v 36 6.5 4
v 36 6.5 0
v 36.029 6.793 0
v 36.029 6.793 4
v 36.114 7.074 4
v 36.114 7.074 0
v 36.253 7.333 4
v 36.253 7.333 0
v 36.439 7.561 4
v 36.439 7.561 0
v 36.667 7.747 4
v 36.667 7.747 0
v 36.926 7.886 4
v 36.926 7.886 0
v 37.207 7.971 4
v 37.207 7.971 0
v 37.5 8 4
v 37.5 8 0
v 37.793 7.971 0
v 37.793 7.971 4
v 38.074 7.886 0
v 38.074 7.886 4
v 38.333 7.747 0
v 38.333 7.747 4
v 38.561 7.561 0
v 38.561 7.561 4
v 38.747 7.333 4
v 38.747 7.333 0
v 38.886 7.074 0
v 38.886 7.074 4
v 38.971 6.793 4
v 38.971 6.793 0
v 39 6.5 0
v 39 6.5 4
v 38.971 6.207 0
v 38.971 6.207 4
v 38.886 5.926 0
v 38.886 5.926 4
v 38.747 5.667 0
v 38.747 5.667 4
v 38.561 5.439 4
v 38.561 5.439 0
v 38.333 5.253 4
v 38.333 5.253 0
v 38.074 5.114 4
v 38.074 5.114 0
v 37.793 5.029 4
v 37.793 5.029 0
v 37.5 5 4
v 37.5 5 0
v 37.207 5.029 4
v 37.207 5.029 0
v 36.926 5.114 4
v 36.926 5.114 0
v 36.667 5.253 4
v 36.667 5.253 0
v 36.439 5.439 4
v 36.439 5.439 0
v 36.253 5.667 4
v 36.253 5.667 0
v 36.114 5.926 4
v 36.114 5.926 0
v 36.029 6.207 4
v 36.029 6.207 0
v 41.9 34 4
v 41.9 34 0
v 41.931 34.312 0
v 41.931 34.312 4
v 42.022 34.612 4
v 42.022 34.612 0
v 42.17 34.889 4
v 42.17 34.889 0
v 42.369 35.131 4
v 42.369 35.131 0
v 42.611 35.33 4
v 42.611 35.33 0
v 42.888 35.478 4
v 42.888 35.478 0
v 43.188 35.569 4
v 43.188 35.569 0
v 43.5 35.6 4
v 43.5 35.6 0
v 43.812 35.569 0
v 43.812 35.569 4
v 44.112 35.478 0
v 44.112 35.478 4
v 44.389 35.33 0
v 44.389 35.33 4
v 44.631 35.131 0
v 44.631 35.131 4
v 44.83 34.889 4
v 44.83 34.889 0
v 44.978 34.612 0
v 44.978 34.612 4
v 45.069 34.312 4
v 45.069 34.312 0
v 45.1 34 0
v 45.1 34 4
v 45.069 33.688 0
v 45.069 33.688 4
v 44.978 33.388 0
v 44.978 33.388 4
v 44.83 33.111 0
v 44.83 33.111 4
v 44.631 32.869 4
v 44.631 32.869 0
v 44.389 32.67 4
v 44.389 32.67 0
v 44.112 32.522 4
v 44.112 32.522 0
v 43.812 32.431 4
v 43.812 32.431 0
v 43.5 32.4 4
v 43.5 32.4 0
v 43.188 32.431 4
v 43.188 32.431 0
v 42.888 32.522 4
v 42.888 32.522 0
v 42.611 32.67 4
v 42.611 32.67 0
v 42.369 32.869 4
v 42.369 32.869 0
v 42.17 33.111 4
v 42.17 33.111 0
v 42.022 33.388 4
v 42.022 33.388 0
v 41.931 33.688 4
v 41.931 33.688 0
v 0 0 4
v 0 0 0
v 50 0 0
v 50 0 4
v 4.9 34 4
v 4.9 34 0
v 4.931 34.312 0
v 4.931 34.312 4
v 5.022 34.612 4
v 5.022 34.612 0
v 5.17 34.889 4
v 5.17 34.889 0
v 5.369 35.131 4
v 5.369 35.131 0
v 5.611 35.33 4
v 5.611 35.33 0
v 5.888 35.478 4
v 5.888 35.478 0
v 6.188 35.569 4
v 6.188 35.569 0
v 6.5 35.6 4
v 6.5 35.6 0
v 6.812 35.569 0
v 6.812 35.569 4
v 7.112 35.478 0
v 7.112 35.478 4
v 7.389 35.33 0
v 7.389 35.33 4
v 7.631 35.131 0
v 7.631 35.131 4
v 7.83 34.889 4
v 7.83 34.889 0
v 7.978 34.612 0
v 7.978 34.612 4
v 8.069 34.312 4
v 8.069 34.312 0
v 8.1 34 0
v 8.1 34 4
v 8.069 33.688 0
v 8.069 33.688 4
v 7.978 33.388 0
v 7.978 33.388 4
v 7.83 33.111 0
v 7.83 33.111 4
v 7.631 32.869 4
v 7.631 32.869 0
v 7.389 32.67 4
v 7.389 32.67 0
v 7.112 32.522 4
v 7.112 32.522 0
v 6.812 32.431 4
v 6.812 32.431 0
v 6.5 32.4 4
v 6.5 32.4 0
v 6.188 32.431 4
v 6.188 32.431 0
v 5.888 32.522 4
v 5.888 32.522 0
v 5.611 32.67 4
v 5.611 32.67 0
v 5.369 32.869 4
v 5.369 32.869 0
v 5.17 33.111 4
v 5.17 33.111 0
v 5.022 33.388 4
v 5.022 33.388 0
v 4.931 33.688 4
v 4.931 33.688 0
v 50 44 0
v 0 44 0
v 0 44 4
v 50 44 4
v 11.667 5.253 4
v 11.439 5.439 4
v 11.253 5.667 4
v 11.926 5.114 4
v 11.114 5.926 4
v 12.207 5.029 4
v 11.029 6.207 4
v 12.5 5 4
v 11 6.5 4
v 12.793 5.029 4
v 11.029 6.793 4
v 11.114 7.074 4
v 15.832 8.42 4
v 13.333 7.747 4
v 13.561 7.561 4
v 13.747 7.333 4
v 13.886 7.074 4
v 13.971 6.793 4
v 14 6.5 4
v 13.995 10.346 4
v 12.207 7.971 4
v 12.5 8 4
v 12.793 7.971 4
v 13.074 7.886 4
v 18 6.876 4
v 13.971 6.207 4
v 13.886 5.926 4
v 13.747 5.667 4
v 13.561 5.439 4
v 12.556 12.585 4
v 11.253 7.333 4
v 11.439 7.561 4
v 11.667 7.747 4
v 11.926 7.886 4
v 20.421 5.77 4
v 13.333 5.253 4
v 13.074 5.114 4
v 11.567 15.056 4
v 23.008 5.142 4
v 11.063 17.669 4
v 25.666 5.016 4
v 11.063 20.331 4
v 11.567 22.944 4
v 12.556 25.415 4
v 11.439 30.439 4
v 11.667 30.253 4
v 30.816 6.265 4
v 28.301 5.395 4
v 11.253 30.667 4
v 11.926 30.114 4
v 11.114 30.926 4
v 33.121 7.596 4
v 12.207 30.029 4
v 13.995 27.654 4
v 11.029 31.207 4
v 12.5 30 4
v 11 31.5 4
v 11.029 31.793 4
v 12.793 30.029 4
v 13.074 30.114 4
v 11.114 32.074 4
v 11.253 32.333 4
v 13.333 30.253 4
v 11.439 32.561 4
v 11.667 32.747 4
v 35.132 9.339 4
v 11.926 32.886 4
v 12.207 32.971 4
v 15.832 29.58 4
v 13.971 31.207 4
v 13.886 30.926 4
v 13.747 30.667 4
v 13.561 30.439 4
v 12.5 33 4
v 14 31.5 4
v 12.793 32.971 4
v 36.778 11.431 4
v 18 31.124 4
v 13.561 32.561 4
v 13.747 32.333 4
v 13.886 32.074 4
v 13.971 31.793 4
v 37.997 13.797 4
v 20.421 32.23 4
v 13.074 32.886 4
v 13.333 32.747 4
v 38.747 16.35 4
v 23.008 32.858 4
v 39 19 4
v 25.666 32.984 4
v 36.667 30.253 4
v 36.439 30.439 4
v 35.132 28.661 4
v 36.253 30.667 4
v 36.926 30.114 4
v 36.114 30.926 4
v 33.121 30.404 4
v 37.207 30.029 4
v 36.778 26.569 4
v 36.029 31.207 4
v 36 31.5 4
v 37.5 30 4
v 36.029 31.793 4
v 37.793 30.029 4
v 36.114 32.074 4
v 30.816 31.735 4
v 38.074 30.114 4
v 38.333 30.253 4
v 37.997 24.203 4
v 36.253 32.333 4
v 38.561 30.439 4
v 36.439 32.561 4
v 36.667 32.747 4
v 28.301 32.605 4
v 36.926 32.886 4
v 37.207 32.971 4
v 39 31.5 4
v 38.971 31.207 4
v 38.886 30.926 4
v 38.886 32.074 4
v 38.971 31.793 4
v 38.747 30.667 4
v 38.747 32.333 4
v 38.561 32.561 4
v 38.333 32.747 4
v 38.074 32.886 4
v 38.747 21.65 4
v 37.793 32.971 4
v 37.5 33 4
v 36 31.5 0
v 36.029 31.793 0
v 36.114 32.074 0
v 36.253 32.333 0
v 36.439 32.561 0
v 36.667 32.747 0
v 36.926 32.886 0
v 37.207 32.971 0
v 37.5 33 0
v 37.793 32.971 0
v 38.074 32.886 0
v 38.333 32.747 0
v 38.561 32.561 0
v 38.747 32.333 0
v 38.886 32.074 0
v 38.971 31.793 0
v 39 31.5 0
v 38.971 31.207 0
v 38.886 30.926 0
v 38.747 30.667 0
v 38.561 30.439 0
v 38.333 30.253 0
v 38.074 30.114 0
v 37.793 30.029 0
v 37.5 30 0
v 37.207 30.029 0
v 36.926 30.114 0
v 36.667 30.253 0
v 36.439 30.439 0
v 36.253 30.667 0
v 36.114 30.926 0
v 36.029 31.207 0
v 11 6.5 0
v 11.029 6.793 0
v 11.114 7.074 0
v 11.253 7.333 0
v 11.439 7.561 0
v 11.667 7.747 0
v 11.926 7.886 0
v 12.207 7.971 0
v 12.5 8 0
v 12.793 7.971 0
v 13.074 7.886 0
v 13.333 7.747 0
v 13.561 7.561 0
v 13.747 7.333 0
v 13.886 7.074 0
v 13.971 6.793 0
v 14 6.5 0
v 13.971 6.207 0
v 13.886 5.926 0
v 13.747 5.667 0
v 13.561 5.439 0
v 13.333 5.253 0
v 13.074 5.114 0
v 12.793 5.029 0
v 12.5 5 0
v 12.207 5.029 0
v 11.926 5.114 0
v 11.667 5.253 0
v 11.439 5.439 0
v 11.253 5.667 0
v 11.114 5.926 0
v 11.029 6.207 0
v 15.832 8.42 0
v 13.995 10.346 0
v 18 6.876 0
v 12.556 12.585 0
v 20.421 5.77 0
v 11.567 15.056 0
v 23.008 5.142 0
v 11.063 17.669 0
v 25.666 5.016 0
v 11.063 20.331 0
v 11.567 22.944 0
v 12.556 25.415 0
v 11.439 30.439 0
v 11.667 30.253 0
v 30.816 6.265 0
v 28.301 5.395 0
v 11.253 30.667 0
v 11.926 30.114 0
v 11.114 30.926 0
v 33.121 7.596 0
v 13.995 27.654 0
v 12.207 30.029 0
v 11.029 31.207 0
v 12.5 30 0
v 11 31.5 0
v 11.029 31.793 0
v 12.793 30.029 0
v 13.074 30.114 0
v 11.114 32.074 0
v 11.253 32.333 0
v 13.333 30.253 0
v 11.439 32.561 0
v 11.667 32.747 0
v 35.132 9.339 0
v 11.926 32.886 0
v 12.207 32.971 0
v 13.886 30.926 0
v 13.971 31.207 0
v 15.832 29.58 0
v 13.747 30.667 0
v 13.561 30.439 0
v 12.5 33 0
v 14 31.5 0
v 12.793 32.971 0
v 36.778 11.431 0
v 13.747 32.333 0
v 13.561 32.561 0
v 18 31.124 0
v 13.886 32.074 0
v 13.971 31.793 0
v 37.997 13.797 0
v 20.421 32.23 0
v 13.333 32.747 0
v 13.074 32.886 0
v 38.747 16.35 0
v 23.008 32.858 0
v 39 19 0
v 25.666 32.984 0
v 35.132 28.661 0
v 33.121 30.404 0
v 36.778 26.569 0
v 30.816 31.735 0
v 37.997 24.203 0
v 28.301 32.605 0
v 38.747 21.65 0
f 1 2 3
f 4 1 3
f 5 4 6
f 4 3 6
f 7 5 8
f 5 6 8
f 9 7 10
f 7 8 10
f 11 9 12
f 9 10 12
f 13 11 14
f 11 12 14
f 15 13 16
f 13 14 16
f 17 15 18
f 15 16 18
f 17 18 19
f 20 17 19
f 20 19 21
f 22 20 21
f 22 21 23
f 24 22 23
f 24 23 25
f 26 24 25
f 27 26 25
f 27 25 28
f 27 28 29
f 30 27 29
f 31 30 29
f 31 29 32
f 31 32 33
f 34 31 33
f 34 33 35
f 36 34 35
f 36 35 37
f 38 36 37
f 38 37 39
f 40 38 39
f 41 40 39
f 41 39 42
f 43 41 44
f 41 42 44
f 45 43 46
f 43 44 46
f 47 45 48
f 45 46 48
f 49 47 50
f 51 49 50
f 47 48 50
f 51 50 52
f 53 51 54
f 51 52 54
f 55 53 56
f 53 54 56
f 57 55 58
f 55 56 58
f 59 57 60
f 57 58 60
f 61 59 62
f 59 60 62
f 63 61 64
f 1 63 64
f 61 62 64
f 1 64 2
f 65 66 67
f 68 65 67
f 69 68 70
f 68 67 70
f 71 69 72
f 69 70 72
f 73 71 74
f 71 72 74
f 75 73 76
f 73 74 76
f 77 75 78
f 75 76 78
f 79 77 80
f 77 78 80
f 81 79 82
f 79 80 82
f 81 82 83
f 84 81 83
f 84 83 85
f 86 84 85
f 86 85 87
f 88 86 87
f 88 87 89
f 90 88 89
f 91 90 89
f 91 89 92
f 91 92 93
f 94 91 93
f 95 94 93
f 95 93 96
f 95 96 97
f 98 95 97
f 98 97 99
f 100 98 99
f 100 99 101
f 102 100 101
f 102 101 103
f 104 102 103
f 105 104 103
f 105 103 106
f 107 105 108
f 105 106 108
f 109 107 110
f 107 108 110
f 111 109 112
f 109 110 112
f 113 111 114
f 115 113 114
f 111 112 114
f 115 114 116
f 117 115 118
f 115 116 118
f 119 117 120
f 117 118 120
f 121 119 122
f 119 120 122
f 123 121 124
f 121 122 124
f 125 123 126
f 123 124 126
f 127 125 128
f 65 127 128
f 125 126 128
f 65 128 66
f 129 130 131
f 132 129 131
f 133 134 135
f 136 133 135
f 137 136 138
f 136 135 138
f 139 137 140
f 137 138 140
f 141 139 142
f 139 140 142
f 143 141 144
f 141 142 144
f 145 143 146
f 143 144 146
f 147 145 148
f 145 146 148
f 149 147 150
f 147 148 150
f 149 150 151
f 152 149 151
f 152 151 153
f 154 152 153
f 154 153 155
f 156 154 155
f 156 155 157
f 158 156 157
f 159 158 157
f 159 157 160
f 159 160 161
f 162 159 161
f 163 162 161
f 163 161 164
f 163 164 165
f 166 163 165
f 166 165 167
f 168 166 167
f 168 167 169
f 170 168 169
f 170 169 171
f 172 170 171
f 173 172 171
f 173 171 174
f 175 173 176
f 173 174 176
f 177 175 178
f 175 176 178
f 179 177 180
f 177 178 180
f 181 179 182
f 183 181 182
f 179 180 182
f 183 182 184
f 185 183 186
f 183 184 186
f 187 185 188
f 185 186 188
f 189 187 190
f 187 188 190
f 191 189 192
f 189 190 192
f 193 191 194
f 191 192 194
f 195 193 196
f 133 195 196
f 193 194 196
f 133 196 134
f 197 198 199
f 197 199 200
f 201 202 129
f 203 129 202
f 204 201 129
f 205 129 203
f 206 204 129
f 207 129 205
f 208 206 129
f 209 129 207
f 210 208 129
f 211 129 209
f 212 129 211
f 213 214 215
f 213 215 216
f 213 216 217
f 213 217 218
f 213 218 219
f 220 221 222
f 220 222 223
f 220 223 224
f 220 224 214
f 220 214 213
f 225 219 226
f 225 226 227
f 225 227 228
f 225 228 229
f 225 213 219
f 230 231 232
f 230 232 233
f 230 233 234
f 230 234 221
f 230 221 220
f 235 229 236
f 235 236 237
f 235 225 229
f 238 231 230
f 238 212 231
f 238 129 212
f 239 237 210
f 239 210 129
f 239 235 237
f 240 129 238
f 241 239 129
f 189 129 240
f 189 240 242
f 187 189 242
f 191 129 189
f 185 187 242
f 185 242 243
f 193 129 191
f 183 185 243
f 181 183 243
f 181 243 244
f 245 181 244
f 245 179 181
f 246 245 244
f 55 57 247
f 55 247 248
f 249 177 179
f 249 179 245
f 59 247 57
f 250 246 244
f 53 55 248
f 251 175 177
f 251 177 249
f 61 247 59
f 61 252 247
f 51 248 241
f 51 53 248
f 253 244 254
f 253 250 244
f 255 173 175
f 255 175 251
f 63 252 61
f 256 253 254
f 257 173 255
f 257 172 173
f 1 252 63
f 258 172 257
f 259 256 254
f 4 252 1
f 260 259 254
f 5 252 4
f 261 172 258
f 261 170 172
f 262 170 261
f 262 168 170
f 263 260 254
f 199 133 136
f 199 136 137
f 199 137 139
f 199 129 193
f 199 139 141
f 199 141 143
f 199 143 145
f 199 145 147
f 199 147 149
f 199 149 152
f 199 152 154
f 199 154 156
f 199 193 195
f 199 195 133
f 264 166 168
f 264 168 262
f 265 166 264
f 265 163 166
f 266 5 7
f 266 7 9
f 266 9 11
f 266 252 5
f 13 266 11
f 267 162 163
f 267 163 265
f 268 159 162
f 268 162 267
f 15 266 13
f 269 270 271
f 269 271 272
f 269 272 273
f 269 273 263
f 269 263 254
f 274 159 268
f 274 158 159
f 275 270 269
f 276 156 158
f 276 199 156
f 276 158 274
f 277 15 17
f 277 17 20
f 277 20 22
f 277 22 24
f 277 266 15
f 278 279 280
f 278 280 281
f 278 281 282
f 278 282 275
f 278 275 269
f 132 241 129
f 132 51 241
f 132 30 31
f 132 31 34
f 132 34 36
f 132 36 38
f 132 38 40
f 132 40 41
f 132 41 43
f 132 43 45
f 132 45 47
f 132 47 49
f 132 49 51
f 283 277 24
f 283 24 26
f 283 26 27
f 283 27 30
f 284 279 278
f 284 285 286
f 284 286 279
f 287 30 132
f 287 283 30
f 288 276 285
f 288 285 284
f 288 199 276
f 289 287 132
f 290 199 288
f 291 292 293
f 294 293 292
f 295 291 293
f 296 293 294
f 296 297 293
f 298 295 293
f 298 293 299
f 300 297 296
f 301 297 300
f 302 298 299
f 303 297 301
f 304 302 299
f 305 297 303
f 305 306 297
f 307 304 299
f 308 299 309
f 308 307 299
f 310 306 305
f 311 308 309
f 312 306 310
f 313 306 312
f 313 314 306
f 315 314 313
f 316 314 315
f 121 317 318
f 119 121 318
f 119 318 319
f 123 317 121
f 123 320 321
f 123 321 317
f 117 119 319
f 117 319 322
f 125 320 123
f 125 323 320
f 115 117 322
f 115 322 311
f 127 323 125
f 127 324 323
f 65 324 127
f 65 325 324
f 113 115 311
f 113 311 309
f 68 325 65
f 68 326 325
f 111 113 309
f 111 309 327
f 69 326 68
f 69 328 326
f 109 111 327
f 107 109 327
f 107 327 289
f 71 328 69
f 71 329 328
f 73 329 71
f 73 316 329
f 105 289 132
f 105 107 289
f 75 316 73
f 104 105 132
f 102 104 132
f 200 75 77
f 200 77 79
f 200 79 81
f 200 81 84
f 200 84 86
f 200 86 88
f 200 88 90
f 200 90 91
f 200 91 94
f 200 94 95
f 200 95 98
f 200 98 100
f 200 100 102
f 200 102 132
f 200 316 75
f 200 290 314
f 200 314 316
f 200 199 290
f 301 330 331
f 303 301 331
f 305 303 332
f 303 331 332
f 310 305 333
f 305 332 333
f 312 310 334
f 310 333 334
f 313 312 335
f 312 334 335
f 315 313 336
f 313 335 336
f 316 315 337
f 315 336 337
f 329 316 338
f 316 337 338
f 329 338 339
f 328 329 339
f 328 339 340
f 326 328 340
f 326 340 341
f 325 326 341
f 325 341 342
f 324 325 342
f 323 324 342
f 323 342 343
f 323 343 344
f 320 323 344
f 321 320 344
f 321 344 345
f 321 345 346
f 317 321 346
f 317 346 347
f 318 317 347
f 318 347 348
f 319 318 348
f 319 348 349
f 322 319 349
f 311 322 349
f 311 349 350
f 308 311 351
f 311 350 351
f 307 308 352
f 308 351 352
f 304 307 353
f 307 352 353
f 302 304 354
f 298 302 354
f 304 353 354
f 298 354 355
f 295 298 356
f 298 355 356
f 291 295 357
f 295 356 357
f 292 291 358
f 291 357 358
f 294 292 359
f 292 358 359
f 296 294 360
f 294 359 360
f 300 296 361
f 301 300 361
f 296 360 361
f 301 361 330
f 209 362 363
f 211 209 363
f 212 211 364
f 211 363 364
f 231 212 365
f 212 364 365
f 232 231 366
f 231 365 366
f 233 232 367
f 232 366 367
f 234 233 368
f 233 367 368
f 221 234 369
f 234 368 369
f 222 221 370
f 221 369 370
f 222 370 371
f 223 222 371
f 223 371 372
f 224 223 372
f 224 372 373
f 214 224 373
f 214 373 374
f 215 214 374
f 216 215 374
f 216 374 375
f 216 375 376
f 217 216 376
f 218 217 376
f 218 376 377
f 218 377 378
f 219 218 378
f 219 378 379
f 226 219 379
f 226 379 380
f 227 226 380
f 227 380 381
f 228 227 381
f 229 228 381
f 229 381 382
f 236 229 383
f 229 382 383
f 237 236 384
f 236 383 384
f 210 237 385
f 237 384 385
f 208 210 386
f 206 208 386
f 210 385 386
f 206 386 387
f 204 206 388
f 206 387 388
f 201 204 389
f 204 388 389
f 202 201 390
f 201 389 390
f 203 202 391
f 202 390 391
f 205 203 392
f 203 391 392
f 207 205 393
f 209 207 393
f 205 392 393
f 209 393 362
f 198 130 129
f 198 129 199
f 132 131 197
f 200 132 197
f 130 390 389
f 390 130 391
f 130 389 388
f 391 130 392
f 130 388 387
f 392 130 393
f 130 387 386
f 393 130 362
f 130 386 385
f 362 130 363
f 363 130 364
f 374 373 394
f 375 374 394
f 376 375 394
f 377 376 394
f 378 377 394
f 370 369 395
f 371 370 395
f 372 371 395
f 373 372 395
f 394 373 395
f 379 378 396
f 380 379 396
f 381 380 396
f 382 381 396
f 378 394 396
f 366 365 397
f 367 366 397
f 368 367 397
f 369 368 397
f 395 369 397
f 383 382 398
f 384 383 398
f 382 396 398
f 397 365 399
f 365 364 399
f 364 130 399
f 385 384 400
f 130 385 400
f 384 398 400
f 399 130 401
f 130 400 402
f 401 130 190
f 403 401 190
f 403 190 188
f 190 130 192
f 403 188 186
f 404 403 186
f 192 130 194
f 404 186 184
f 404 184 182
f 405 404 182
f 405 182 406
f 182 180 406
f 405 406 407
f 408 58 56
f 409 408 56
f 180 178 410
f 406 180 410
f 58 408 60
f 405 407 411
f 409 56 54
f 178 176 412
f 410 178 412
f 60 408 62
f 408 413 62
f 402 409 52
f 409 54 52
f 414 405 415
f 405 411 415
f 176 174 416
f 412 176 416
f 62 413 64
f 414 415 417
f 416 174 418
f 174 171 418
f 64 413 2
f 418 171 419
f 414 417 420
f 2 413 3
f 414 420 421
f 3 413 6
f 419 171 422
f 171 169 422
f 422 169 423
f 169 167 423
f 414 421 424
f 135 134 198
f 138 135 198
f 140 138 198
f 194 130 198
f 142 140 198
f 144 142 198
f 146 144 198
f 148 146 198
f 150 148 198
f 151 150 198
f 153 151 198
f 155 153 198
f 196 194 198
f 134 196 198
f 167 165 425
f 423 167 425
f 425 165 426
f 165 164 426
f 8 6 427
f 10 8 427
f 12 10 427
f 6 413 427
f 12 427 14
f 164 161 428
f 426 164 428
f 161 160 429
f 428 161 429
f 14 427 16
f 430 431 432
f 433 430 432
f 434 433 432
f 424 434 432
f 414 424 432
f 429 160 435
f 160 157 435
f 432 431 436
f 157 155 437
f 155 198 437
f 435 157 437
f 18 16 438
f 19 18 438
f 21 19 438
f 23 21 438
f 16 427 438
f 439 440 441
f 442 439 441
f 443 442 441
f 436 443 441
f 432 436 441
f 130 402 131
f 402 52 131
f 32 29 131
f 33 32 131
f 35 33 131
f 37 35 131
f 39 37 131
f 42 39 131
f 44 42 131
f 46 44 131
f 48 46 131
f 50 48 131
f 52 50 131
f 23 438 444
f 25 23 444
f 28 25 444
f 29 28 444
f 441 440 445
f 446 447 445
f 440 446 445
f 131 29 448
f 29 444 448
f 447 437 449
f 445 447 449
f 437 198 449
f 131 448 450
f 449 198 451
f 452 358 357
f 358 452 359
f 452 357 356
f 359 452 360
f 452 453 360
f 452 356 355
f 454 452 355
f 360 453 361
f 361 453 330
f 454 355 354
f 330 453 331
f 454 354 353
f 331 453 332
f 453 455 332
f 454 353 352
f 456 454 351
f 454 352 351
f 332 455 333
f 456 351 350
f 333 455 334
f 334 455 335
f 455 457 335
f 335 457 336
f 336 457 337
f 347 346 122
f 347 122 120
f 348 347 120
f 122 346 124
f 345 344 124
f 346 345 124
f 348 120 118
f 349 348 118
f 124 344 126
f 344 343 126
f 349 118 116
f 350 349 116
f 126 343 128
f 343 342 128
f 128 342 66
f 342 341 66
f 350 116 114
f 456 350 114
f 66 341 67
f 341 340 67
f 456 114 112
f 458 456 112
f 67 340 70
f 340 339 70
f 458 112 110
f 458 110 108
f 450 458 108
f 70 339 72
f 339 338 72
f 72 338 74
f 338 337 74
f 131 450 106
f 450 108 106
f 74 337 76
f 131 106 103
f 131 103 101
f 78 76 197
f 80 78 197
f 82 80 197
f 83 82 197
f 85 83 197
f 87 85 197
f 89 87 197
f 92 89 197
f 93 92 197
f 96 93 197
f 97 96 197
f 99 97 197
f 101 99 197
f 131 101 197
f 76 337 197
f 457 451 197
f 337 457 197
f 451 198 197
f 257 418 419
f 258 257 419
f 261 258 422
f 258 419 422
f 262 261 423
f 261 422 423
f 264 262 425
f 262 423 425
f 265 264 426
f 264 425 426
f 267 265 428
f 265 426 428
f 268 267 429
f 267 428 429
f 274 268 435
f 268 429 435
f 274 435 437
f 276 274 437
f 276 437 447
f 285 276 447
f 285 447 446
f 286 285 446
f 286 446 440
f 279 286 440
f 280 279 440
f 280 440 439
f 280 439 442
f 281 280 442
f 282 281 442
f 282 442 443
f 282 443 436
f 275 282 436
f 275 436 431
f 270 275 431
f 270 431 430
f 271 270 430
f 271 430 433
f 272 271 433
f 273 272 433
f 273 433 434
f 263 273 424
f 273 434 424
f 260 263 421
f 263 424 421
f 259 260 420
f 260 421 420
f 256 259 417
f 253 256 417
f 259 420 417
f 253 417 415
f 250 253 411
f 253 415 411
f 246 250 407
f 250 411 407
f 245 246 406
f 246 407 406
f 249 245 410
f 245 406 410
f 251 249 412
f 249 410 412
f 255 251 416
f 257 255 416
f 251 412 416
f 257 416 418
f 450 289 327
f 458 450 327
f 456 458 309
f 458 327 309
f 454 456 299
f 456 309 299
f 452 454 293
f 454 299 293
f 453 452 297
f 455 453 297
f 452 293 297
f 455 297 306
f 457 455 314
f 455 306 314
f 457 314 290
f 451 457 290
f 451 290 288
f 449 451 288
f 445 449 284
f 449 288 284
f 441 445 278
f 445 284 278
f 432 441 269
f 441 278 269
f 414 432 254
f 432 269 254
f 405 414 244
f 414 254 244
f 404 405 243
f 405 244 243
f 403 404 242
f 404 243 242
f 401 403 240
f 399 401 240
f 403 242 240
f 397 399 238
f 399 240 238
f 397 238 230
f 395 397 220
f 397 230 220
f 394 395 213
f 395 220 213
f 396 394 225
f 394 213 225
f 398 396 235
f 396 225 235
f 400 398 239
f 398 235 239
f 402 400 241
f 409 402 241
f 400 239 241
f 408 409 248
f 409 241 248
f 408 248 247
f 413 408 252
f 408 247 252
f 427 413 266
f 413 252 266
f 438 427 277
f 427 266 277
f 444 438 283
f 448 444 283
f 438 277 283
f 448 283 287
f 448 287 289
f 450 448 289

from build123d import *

# Parameters (mm, degrees)
SKETCH1_W             = 50
SKETCH1_H             = 44
BOSS_EXTRUDE1_DEPTH   = 4
F_3_0MM_DOWEL_HOLE1_D = 3.2
SKETCH4_R             = 14
CUT_EXTRUDE1_DEPTH    = 4
F_3_0MM_DOWEL_HOLE2_D = 3


with BuildPart() as part:
    # Sketch1 → Boss-Extrude1 (new body)
    with BuildSketch(Plane.XY):
        with Locations((25, 22)):
            Rectangle(SKETCH1_W, SKETCH1_H)
    extrude(amount=BOSS_EXTRUDE1_DEPTH)

    # Ø3.0mm Dowel Hole1 (through all)
    with Locations(Plane.XY.offset(4)):
        with Locations((6.5, 34), (43.5, 34)):
            Hole(F_3_0MM_DOWEL_HOLE1_D / 2)

    # Sketch4 → Cut-Extrude1 (cut)
    with BuildSketch(Plane.XY.offset(4)):
        with Locations((25, 19)):
            Circle(SKETCH4_R)
    extrude(amount=-CUT_EXTRUDE1_DEPTH, mode=Mode.SUBTRACT)

    # Ø3.0mm Dowel Hole2 (through all)
    with Locations(Plane.XY.offset(4)):
        with Locations((12.5, 31.5), (25, 19), (37.5, 31.5), (37.5, 6.5), (12.5, 6.5)):
            Hole(F_3_0MM_DOWEL_HOLE2_D / 2)


solid = part.part
